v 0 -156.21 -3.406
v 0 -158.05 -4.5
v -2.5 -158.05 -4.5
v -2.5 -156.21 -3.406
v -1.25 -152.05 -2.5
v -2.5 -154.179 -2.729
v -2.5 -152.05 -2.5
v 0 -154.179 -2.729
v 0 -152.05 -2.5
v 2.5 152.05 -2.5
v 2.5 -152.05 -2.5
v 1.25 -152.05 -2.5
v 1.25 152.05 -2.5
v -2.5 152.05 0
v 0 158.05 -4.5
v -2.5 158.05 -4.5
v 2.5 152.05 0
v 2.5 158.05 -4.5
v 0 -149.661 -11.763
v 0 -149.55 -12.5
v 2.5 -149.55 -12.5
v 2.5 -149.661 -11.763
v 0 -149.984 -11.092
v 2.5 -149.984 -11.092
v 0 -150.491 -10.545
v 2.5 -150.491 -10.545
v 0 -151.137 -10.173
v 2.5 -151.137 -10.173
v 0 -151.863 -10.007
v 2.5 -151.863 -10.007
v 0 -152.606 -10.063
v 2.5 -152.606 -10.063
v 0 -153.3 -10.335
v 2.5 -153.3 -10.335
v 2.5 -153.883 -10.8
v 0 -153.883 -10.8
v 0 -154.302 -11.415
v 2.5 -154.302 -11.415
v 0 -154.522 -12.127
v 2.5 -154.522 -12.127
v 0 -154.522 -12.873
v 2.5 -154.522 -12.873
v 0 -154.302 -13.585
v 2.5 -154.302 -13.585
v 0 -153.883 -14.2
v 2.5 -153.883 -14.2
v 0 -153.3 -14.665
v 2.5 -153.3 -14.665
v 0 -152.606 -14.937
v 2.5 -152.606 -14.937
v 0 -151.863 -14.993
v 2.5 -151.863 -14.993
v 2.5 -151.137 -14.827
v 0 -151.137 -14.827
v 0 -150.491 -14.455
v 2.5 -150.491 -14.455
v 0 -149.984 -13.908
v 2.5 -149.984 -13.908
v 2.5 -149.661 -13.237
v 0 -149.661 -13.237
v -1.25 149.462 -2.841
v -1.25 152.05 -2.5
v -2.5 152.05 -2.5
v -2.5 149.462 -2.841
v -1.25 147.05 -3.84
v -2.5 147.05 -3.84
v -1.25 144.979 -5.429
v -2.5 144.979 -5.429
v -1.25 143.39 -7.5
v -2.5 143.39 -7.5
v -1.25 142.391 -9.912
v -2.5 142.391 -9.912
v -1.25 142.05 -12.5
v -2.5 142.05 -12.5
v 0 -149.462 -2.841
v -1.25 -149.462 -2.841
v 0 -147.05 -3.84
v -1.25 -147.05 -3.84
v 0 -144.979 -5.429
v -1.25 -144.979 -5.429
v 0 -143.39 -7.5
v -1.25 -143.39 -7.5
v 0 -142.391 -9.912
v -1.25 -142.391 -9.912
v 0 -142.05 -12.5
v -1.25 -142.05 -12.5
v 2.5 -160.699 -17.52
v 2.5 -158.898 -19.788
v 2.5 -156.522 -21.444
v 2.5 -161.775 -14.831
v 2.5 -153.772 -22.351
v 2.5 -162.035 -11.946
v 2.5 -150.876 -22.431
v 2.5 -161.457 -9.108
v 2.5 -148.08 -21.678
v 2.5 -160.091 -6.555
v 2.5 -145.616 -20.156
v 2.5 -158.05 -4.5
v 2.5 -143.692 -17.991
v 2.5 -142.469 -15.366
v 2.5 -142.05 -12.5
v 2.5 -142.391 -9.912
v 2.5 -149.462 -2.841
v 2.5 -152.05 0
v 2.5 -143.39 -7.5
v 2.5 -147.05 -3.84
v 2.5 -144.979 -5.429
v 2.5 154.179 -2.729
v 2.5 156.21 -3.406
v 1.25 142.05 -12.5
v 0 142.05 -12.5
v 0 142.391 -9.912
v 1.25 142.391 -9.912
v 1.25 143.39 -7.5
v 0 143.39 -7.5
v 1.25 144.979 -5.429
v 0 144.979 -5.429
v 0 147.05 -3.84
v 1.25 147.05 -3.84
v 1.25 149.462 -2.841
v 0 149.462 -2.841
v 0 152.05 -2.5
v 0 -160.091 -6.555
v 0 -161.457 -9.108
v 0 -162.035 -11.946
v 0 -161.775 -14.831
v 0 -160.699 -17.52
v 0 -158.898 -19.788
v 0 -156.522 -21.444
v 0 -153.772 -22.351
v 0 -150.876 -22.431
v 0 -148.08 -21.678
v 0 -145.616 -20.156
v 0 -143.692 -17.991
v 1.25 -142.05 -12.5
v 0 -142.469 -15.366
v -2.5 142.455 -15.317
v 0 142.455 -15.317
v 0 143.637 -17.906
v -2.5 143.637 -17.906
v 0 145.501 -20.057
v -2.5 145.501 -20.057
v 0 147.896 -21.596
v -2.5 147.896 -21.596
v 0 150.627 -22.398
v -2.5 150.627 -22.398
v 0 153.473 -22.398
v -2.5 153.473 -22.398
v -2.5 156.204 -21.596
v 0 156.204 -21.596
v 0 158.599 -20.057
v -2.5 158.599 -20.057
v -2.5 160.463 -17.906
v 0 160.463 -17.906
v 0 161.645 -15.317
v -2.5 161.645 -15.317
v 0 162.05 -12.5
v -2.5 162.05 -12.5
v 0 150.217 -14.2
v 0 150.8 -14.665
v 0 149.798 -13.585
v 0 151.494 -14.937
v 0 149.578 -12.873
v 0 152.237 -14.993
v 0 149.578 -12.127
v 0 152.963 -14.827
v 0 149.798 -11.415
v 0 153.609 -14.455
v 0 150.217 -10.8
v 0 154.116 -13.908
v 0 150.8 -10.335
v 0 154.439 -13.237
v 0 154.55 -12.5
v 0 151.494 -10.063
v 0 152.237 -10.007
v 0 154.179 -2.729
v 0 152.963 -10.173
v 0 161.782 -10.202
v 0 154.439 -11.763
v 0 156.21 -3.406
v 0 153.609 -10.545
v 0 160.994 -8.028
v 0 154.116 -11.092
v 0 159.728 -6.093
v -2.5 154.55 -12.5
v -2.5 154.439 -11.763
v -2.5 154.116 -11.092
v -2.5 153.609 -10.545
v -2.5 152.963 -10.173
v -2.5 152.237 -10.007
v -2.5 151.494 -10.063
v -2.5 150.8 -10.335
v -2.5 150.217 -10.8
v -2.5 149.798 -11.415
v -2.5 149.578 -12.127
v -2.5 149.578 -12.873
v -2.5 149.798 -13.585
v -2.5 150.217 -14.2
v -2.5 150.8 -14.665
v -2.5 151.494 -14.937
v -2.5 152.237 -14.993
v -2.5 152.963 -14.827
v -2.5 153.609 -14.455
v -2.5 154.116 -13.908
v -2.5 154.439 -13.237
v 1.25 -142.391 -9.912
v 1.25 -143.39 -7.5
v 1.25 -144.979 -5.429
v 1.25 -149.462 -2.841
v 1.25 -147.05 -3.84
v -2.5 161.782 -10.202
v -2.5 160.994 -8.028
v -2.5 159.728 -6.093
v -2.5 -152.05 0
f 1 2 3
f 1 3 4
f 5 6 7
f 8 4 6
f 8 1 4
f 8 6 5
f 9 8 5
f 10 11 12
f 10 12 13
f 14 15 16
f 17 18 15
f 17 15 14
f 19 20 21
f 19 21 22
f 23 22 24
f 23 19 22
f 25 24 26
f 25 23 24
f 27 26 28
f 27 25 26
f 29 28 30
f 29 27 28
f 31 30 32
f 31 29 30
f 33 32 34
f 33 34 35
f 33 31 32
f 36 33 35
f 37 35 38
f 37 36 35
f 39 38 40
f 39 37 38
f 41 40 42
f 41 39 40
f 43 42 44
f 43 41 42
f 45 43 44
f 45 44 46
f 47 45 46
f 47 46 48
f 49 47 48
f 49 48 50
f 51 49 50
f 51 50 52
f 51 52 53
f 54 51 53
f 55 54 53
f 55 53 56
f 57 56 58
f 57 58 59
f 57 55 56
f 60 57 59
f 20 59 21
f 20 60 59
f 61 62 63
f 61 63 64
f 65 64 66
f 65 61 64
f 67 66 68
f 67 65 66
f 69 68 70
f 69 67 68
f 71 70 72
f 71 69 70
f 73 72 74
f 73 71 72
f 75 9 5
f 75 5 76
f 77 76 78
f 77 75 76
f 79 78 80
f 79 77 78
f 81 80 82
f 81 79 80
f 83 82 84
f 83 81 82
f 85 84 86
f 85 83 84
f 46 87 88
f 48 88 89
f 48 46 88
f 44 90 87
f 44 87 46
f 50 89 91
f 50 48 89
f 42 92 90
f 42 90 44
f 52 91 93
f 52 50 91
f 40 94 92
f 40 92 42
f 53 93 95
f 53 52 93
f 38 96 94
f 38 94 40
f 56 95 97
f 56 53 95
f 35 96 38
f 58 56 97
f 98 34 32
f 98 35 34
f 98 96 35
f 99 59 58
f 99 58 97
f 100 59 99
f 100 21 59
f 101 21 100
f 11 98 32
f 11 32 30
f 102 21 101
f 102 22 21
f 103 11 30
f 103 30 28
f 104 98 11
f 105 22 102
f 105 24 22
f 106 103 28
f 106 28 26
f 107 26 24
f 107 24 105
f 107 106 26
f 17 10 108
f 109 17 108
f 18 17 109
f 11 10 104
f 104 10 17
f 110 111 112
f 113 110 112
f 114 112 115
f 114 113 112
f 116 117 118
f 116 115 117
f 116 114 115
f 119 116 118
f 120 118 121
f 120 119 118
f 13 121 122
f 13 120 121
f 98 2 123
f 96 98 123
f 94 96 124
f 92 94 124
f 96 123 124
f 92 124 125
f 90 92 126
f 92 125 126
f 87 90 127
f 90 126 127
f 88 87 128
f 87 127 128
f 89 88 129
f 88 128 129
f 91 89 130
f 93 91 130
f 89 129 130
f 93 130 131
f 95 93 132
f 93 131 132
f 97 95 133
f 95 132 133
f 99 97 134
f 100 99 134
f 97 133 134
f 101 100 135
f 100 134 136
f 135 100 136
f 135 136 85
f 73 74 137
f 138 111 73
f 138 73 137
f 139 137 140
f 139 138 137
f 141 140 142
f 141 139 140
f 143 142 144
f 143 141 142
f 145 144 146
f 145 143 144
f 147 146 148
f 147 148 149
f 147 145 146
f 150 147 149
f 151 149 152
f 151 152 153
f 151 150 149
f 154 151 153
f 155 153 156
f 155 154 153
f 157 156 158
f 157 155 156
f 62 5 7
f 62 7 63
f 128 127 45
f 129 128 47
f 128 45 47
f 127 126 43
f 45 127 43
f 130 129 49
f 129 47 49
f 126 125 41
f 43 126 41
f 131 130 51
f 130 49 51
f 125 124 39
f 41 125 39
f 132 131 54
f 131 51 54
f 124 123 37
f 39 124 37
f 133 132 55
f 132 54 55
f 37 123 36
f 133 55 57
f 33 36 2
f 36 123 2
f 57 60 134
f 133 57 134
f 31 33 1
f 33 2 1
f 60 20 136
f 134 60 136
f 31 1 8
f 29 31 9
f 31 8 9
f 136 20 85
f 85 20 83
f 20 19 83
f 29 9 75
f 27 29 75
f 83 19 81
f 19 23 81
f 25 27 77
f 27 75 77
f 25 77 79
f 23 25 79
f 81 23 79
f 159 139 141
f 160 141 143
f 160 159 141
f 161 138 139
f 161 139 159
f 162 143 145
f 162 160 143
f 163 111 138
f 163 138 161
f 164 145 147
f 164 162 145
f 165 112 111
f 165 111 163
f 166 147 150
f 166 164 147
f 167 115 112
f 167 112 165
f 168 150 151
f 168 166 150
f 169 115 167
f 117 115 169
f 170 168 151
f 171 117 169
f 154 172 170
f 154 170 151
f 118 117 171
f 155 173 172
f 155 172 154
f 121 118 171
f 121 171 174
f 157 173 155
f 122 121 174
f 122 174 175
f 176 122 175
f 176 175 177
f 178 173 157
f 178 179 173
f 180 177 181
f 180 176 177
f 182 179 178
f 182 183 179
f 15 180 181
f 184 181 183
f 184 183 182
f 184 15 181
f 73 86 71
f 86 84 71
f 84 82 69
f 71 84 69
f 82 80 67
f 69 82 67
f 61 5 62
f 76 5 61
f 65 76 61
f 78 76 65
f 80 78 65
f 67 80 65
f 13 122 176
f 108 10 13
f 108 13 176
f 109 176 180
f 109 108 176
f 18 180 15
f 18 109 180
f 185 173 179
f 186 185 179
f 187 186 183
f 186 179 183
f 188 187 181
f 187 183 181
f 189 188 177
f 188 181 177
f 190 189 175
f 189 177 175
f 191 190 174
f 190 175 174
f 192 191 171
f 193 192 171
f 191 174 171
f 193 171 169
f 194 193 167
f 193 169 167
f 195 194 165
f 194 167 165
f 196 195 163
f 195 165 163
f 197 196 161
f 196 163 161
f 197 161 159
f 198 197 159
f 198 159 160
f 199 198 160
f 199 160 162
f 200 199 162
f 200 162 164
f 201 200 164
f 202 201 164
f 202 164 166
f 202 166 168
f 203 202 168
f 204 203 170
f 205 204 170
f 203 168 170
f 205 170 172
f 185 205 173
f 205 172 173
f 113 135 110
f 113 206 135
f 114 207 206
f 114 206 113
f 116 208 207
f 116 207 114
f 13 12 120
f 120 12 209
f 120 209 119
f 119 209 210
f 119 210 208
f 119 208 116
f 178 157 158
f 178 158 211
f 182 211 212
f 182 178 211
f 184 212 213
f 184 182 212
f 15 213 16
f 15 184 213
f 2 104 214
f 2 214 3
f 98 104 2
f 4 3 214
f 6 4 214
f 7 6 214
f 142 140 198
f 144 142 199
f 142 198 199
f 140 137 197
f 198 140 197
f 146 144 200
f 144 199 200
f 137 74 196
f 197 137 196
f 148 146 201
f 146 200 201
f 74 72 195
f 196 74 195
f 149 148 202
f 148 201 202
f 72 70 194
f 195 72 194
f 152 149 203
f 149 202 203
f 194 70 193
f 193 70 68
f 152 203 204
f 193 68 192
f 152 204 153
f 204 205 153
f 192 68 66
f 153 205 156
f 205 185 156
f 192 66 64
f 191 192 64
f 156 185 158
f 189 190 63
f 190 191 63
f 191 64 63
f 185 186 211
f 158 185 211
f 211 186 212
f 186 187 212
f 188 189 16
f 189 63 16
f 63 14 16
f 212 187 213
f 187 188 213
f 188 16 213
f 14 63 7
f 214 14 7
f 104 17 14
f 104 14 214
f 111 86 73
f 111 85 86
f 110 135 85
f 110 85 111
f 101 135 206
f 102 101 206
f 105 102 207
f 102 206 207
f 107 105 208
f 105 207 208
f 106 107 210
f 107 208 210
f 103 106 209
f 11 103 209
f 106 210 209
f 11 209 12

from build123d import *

# Parameters (mm, degrees)
F1_DEPTH = 2.5
F2_DEPTH = 1.25
F0_R     = 2.5
F3_DEPTH = 2.5
F4_DEPTH = 2.5


with BuildPart() as f1:
    # F0 (on Right) → F1 (new body, symmetric)
    with BuildSketch(Plane.YZ):
        with BuildLine():
            ThreePointArc((152.05, -2.5), (155.212278, -3.013167), (158.05, -4.5))
            Line((158.05, -4.5), (152.05, 0))
            Line((152.05, 0), (-152.05, 0))
            Line((-152.05, 0), (-158.05, -4.5))
            ThreePointArc((-158.05, -4.5), (-155.212278, -3.013167), (-152.05, -2.5))
            Line((-152.05, -2.5), (152.05, -2.5))
        make_face()
    extrude(amount=F1_DEPTH, both=True)



with BuildPart() as f2:
    # F0 (on Right) → F2 (new body, symmetric)
    with BuildSketch(Plane.YZ):
        with BuildLine():
            Line((-142.05, -12.5), (142.05, -12.5))
            ThreePointArc((142.05, -12.5), (144.978932, -5.428932), (152.05, -2.5))
            Line((152.05, -2.5), (-152.05, -2.5))
            ThreePointArc((-152.05, -2.5), (-144.978932, -5.428932), (-142.05, -12.5))
        make_face()
    extrude(amount=F2_DEPTH, both=True)


with BuildPart() as f1_1:
    add(f1.part)

    add(f2.part)  # F3 merges F2
    # F0 (on Right) → F3 (join)
    with BuildSketch(Plane.YZ):
        with BuildLine():
            ThreePointArc((-158.05, -4.5), (-156.522136, -21.444272), (-142.05, -12.5))
            ThreePointArc((-142.05, -12.5), (-144.978932, -5.428932), (-152.05, -2.5))
            ThreePointArc((-152.05, -2.5), (-155.212278, -3.013167), (-158.05, -4.5))
        make_face()
        with Locations((-152.05, -12.5)):
            Circle(F0_R, mode=Mode.SUBTRACT)
    extrude(amount=F3_DEPTH)

    # F0 (on Right) → F4 (join)
    with BuildSketch(Plane.YZ):
        with BuildLine():
            ThreePointArc((142.05, -12.5), (152.05, -22.5), (162.05, -12.5))
            ThreePointArc((162.05, -12.5), (160.994272, -8.027864), (158.05, -4.5))
            ThreePointArc((158.05, -4.5), (155.212278, -3.013167), (152.05, -2.5))
            ThreePointArc((152.05, -2.5), (144.978932, -5.428932), (142.05, -12.5))
        make_face()
        with Locations((152.05, -12.5)):
            Circle(F0_R, mode=Mode.SUBTRACT)
    extrude(amount=-F4_DEPTH)


solid = f1_1.part
